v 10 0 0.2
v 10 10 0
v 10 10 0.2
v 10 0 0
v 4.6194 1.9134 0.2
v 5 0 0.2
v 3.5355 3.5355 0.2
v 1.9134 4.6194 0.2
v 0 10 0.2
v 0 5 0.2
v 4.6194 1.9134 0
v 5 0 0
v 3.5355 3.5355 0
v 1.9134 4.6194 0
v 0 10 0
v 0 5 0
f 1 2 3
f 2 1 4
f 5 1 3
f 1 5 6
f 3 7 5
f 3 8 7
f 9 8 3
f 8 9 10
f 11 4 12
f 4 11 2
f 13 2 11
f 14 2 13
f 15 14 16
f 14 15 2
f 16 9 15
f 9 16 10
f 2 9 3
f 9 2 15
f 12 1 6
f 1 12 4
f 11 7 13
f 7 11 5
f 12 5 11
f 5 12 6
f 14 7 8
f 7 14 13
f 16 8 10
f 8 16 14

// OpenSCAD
difference() {
	cube(size = [10, 10, 0.2000000000]);
	cylinder(h = 5, r = 5);
}
/***********************************************
******      SolidPython code:      *************
************************************************
 
from solid import *
from random import *
from math import *
import sys
import copy

sys.path.append( "../../../" )
from zack.lib.mat import *
from zack.lib.pathmat import *


sponge = difference()(
	cube([10,10,0.2]),
	cylinder( r=5, h=5 )
)

scad_render_to_file(
	sponge, "sponge.scad"
)
 
 
***********************************************/
                            
